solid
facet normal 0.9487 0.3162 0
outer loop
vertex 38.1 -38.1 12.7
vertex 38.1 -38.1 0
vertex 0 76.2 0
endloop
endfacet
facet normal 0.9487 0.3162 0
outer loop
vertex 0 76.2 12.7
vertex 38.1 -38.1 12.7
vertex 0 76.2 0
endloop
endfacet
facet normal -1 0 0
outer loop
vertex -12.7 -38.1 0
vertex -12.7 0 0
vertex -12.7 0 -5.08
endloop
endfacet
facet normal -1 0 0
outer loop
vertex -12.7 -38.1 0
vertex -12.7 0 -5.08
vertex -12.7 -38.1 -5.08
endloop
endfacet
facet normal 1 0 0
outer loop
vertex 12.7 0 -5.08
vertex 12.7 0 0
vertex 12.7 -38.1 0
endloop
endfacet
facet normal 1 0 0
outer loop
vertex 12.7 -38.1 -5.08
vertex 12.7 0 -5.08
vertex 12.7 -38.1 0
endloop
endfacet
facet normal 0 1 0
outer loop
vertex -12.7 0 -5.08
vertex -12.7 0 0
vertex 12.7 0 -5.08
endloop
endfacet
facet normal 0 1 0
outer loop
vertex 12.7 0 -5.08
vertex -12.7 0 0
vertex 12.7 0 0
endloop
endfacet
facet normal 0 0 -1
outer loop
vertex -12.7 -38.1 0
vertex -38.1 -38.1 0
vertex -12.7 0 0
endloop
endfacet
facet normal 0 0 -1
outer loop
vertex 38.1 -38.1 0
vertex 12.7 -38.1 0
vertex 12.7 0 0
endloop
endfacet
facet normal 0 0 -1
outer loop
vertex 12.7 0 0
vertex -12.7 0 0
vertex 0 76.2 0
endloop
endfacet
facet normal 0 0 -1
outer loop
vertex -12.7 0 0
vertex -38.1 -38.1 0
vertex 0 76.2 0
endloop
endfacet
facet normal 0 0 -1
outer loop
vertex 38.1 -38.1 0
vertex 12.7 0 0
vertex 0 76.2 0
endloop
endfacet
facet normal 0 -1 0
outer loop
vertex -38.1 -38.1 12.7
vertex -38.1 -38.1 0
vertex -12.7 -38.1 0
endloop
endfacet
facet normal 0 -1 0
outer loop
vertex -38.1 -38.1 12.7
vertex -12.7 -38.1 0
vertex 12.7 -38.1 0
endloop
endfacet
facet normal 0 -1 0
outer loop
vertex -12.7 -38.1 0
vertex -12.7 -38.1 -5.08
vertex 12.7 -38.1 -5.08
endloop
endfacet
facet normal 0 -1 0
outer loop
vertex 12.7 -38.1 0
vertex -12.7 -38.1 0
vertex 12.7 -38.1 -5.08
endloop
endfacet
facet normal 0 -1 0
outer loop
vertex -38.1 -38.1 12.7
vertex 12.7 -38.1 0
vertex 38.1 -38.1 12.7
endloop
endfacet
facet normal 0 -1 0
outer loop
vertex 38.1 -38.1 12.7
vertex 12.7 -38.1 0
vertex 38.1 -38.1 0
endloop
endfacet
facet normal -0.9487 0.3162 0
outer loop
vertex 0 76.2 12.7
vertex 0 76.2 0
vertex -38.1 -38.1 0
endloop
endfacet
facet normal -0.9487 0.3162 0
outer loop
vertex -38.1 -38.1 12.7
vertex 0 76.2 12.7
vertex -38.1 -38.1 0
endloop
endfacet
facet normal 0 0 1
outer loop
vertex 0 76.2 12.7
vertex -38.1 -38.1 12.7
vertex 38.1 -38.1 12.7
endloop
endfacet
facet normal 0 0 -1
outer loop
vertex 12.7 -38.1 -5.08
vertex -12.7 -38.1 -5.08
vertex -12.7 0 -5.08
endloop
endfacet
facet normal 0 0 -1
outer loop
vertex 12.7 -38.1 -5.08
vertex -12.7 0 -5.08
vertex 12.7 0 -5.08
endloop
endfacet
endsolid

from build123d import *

# Parameters (mm, degrees)
F1_DEPTH = 12.7
F2_W     = 25.4
F2_H     = 38.1
F3_DEPTH = 5.08


with BuildPart() as f1:
    # F0 (on Top) → F1 (new body)
    with BuildSketch(Plane.XY):
        Polygon((0, 76.2), (-38.1, -38.1), (38.1, -38.1), align=None)
    extrude(amount=F1_DEPTH)

    # F2 (on face) → F3 (join)
    with BuildSketch(Plane(origin=(0, 0, 0), x_dir=(1, 0, 0), z_dir=(0, 0, -1))):
        with Locations((0, 19.05)):
            Rectangle(F2_W, F2_H)
    extrude(amount=F3_DEPTH)


solid = f1.part
